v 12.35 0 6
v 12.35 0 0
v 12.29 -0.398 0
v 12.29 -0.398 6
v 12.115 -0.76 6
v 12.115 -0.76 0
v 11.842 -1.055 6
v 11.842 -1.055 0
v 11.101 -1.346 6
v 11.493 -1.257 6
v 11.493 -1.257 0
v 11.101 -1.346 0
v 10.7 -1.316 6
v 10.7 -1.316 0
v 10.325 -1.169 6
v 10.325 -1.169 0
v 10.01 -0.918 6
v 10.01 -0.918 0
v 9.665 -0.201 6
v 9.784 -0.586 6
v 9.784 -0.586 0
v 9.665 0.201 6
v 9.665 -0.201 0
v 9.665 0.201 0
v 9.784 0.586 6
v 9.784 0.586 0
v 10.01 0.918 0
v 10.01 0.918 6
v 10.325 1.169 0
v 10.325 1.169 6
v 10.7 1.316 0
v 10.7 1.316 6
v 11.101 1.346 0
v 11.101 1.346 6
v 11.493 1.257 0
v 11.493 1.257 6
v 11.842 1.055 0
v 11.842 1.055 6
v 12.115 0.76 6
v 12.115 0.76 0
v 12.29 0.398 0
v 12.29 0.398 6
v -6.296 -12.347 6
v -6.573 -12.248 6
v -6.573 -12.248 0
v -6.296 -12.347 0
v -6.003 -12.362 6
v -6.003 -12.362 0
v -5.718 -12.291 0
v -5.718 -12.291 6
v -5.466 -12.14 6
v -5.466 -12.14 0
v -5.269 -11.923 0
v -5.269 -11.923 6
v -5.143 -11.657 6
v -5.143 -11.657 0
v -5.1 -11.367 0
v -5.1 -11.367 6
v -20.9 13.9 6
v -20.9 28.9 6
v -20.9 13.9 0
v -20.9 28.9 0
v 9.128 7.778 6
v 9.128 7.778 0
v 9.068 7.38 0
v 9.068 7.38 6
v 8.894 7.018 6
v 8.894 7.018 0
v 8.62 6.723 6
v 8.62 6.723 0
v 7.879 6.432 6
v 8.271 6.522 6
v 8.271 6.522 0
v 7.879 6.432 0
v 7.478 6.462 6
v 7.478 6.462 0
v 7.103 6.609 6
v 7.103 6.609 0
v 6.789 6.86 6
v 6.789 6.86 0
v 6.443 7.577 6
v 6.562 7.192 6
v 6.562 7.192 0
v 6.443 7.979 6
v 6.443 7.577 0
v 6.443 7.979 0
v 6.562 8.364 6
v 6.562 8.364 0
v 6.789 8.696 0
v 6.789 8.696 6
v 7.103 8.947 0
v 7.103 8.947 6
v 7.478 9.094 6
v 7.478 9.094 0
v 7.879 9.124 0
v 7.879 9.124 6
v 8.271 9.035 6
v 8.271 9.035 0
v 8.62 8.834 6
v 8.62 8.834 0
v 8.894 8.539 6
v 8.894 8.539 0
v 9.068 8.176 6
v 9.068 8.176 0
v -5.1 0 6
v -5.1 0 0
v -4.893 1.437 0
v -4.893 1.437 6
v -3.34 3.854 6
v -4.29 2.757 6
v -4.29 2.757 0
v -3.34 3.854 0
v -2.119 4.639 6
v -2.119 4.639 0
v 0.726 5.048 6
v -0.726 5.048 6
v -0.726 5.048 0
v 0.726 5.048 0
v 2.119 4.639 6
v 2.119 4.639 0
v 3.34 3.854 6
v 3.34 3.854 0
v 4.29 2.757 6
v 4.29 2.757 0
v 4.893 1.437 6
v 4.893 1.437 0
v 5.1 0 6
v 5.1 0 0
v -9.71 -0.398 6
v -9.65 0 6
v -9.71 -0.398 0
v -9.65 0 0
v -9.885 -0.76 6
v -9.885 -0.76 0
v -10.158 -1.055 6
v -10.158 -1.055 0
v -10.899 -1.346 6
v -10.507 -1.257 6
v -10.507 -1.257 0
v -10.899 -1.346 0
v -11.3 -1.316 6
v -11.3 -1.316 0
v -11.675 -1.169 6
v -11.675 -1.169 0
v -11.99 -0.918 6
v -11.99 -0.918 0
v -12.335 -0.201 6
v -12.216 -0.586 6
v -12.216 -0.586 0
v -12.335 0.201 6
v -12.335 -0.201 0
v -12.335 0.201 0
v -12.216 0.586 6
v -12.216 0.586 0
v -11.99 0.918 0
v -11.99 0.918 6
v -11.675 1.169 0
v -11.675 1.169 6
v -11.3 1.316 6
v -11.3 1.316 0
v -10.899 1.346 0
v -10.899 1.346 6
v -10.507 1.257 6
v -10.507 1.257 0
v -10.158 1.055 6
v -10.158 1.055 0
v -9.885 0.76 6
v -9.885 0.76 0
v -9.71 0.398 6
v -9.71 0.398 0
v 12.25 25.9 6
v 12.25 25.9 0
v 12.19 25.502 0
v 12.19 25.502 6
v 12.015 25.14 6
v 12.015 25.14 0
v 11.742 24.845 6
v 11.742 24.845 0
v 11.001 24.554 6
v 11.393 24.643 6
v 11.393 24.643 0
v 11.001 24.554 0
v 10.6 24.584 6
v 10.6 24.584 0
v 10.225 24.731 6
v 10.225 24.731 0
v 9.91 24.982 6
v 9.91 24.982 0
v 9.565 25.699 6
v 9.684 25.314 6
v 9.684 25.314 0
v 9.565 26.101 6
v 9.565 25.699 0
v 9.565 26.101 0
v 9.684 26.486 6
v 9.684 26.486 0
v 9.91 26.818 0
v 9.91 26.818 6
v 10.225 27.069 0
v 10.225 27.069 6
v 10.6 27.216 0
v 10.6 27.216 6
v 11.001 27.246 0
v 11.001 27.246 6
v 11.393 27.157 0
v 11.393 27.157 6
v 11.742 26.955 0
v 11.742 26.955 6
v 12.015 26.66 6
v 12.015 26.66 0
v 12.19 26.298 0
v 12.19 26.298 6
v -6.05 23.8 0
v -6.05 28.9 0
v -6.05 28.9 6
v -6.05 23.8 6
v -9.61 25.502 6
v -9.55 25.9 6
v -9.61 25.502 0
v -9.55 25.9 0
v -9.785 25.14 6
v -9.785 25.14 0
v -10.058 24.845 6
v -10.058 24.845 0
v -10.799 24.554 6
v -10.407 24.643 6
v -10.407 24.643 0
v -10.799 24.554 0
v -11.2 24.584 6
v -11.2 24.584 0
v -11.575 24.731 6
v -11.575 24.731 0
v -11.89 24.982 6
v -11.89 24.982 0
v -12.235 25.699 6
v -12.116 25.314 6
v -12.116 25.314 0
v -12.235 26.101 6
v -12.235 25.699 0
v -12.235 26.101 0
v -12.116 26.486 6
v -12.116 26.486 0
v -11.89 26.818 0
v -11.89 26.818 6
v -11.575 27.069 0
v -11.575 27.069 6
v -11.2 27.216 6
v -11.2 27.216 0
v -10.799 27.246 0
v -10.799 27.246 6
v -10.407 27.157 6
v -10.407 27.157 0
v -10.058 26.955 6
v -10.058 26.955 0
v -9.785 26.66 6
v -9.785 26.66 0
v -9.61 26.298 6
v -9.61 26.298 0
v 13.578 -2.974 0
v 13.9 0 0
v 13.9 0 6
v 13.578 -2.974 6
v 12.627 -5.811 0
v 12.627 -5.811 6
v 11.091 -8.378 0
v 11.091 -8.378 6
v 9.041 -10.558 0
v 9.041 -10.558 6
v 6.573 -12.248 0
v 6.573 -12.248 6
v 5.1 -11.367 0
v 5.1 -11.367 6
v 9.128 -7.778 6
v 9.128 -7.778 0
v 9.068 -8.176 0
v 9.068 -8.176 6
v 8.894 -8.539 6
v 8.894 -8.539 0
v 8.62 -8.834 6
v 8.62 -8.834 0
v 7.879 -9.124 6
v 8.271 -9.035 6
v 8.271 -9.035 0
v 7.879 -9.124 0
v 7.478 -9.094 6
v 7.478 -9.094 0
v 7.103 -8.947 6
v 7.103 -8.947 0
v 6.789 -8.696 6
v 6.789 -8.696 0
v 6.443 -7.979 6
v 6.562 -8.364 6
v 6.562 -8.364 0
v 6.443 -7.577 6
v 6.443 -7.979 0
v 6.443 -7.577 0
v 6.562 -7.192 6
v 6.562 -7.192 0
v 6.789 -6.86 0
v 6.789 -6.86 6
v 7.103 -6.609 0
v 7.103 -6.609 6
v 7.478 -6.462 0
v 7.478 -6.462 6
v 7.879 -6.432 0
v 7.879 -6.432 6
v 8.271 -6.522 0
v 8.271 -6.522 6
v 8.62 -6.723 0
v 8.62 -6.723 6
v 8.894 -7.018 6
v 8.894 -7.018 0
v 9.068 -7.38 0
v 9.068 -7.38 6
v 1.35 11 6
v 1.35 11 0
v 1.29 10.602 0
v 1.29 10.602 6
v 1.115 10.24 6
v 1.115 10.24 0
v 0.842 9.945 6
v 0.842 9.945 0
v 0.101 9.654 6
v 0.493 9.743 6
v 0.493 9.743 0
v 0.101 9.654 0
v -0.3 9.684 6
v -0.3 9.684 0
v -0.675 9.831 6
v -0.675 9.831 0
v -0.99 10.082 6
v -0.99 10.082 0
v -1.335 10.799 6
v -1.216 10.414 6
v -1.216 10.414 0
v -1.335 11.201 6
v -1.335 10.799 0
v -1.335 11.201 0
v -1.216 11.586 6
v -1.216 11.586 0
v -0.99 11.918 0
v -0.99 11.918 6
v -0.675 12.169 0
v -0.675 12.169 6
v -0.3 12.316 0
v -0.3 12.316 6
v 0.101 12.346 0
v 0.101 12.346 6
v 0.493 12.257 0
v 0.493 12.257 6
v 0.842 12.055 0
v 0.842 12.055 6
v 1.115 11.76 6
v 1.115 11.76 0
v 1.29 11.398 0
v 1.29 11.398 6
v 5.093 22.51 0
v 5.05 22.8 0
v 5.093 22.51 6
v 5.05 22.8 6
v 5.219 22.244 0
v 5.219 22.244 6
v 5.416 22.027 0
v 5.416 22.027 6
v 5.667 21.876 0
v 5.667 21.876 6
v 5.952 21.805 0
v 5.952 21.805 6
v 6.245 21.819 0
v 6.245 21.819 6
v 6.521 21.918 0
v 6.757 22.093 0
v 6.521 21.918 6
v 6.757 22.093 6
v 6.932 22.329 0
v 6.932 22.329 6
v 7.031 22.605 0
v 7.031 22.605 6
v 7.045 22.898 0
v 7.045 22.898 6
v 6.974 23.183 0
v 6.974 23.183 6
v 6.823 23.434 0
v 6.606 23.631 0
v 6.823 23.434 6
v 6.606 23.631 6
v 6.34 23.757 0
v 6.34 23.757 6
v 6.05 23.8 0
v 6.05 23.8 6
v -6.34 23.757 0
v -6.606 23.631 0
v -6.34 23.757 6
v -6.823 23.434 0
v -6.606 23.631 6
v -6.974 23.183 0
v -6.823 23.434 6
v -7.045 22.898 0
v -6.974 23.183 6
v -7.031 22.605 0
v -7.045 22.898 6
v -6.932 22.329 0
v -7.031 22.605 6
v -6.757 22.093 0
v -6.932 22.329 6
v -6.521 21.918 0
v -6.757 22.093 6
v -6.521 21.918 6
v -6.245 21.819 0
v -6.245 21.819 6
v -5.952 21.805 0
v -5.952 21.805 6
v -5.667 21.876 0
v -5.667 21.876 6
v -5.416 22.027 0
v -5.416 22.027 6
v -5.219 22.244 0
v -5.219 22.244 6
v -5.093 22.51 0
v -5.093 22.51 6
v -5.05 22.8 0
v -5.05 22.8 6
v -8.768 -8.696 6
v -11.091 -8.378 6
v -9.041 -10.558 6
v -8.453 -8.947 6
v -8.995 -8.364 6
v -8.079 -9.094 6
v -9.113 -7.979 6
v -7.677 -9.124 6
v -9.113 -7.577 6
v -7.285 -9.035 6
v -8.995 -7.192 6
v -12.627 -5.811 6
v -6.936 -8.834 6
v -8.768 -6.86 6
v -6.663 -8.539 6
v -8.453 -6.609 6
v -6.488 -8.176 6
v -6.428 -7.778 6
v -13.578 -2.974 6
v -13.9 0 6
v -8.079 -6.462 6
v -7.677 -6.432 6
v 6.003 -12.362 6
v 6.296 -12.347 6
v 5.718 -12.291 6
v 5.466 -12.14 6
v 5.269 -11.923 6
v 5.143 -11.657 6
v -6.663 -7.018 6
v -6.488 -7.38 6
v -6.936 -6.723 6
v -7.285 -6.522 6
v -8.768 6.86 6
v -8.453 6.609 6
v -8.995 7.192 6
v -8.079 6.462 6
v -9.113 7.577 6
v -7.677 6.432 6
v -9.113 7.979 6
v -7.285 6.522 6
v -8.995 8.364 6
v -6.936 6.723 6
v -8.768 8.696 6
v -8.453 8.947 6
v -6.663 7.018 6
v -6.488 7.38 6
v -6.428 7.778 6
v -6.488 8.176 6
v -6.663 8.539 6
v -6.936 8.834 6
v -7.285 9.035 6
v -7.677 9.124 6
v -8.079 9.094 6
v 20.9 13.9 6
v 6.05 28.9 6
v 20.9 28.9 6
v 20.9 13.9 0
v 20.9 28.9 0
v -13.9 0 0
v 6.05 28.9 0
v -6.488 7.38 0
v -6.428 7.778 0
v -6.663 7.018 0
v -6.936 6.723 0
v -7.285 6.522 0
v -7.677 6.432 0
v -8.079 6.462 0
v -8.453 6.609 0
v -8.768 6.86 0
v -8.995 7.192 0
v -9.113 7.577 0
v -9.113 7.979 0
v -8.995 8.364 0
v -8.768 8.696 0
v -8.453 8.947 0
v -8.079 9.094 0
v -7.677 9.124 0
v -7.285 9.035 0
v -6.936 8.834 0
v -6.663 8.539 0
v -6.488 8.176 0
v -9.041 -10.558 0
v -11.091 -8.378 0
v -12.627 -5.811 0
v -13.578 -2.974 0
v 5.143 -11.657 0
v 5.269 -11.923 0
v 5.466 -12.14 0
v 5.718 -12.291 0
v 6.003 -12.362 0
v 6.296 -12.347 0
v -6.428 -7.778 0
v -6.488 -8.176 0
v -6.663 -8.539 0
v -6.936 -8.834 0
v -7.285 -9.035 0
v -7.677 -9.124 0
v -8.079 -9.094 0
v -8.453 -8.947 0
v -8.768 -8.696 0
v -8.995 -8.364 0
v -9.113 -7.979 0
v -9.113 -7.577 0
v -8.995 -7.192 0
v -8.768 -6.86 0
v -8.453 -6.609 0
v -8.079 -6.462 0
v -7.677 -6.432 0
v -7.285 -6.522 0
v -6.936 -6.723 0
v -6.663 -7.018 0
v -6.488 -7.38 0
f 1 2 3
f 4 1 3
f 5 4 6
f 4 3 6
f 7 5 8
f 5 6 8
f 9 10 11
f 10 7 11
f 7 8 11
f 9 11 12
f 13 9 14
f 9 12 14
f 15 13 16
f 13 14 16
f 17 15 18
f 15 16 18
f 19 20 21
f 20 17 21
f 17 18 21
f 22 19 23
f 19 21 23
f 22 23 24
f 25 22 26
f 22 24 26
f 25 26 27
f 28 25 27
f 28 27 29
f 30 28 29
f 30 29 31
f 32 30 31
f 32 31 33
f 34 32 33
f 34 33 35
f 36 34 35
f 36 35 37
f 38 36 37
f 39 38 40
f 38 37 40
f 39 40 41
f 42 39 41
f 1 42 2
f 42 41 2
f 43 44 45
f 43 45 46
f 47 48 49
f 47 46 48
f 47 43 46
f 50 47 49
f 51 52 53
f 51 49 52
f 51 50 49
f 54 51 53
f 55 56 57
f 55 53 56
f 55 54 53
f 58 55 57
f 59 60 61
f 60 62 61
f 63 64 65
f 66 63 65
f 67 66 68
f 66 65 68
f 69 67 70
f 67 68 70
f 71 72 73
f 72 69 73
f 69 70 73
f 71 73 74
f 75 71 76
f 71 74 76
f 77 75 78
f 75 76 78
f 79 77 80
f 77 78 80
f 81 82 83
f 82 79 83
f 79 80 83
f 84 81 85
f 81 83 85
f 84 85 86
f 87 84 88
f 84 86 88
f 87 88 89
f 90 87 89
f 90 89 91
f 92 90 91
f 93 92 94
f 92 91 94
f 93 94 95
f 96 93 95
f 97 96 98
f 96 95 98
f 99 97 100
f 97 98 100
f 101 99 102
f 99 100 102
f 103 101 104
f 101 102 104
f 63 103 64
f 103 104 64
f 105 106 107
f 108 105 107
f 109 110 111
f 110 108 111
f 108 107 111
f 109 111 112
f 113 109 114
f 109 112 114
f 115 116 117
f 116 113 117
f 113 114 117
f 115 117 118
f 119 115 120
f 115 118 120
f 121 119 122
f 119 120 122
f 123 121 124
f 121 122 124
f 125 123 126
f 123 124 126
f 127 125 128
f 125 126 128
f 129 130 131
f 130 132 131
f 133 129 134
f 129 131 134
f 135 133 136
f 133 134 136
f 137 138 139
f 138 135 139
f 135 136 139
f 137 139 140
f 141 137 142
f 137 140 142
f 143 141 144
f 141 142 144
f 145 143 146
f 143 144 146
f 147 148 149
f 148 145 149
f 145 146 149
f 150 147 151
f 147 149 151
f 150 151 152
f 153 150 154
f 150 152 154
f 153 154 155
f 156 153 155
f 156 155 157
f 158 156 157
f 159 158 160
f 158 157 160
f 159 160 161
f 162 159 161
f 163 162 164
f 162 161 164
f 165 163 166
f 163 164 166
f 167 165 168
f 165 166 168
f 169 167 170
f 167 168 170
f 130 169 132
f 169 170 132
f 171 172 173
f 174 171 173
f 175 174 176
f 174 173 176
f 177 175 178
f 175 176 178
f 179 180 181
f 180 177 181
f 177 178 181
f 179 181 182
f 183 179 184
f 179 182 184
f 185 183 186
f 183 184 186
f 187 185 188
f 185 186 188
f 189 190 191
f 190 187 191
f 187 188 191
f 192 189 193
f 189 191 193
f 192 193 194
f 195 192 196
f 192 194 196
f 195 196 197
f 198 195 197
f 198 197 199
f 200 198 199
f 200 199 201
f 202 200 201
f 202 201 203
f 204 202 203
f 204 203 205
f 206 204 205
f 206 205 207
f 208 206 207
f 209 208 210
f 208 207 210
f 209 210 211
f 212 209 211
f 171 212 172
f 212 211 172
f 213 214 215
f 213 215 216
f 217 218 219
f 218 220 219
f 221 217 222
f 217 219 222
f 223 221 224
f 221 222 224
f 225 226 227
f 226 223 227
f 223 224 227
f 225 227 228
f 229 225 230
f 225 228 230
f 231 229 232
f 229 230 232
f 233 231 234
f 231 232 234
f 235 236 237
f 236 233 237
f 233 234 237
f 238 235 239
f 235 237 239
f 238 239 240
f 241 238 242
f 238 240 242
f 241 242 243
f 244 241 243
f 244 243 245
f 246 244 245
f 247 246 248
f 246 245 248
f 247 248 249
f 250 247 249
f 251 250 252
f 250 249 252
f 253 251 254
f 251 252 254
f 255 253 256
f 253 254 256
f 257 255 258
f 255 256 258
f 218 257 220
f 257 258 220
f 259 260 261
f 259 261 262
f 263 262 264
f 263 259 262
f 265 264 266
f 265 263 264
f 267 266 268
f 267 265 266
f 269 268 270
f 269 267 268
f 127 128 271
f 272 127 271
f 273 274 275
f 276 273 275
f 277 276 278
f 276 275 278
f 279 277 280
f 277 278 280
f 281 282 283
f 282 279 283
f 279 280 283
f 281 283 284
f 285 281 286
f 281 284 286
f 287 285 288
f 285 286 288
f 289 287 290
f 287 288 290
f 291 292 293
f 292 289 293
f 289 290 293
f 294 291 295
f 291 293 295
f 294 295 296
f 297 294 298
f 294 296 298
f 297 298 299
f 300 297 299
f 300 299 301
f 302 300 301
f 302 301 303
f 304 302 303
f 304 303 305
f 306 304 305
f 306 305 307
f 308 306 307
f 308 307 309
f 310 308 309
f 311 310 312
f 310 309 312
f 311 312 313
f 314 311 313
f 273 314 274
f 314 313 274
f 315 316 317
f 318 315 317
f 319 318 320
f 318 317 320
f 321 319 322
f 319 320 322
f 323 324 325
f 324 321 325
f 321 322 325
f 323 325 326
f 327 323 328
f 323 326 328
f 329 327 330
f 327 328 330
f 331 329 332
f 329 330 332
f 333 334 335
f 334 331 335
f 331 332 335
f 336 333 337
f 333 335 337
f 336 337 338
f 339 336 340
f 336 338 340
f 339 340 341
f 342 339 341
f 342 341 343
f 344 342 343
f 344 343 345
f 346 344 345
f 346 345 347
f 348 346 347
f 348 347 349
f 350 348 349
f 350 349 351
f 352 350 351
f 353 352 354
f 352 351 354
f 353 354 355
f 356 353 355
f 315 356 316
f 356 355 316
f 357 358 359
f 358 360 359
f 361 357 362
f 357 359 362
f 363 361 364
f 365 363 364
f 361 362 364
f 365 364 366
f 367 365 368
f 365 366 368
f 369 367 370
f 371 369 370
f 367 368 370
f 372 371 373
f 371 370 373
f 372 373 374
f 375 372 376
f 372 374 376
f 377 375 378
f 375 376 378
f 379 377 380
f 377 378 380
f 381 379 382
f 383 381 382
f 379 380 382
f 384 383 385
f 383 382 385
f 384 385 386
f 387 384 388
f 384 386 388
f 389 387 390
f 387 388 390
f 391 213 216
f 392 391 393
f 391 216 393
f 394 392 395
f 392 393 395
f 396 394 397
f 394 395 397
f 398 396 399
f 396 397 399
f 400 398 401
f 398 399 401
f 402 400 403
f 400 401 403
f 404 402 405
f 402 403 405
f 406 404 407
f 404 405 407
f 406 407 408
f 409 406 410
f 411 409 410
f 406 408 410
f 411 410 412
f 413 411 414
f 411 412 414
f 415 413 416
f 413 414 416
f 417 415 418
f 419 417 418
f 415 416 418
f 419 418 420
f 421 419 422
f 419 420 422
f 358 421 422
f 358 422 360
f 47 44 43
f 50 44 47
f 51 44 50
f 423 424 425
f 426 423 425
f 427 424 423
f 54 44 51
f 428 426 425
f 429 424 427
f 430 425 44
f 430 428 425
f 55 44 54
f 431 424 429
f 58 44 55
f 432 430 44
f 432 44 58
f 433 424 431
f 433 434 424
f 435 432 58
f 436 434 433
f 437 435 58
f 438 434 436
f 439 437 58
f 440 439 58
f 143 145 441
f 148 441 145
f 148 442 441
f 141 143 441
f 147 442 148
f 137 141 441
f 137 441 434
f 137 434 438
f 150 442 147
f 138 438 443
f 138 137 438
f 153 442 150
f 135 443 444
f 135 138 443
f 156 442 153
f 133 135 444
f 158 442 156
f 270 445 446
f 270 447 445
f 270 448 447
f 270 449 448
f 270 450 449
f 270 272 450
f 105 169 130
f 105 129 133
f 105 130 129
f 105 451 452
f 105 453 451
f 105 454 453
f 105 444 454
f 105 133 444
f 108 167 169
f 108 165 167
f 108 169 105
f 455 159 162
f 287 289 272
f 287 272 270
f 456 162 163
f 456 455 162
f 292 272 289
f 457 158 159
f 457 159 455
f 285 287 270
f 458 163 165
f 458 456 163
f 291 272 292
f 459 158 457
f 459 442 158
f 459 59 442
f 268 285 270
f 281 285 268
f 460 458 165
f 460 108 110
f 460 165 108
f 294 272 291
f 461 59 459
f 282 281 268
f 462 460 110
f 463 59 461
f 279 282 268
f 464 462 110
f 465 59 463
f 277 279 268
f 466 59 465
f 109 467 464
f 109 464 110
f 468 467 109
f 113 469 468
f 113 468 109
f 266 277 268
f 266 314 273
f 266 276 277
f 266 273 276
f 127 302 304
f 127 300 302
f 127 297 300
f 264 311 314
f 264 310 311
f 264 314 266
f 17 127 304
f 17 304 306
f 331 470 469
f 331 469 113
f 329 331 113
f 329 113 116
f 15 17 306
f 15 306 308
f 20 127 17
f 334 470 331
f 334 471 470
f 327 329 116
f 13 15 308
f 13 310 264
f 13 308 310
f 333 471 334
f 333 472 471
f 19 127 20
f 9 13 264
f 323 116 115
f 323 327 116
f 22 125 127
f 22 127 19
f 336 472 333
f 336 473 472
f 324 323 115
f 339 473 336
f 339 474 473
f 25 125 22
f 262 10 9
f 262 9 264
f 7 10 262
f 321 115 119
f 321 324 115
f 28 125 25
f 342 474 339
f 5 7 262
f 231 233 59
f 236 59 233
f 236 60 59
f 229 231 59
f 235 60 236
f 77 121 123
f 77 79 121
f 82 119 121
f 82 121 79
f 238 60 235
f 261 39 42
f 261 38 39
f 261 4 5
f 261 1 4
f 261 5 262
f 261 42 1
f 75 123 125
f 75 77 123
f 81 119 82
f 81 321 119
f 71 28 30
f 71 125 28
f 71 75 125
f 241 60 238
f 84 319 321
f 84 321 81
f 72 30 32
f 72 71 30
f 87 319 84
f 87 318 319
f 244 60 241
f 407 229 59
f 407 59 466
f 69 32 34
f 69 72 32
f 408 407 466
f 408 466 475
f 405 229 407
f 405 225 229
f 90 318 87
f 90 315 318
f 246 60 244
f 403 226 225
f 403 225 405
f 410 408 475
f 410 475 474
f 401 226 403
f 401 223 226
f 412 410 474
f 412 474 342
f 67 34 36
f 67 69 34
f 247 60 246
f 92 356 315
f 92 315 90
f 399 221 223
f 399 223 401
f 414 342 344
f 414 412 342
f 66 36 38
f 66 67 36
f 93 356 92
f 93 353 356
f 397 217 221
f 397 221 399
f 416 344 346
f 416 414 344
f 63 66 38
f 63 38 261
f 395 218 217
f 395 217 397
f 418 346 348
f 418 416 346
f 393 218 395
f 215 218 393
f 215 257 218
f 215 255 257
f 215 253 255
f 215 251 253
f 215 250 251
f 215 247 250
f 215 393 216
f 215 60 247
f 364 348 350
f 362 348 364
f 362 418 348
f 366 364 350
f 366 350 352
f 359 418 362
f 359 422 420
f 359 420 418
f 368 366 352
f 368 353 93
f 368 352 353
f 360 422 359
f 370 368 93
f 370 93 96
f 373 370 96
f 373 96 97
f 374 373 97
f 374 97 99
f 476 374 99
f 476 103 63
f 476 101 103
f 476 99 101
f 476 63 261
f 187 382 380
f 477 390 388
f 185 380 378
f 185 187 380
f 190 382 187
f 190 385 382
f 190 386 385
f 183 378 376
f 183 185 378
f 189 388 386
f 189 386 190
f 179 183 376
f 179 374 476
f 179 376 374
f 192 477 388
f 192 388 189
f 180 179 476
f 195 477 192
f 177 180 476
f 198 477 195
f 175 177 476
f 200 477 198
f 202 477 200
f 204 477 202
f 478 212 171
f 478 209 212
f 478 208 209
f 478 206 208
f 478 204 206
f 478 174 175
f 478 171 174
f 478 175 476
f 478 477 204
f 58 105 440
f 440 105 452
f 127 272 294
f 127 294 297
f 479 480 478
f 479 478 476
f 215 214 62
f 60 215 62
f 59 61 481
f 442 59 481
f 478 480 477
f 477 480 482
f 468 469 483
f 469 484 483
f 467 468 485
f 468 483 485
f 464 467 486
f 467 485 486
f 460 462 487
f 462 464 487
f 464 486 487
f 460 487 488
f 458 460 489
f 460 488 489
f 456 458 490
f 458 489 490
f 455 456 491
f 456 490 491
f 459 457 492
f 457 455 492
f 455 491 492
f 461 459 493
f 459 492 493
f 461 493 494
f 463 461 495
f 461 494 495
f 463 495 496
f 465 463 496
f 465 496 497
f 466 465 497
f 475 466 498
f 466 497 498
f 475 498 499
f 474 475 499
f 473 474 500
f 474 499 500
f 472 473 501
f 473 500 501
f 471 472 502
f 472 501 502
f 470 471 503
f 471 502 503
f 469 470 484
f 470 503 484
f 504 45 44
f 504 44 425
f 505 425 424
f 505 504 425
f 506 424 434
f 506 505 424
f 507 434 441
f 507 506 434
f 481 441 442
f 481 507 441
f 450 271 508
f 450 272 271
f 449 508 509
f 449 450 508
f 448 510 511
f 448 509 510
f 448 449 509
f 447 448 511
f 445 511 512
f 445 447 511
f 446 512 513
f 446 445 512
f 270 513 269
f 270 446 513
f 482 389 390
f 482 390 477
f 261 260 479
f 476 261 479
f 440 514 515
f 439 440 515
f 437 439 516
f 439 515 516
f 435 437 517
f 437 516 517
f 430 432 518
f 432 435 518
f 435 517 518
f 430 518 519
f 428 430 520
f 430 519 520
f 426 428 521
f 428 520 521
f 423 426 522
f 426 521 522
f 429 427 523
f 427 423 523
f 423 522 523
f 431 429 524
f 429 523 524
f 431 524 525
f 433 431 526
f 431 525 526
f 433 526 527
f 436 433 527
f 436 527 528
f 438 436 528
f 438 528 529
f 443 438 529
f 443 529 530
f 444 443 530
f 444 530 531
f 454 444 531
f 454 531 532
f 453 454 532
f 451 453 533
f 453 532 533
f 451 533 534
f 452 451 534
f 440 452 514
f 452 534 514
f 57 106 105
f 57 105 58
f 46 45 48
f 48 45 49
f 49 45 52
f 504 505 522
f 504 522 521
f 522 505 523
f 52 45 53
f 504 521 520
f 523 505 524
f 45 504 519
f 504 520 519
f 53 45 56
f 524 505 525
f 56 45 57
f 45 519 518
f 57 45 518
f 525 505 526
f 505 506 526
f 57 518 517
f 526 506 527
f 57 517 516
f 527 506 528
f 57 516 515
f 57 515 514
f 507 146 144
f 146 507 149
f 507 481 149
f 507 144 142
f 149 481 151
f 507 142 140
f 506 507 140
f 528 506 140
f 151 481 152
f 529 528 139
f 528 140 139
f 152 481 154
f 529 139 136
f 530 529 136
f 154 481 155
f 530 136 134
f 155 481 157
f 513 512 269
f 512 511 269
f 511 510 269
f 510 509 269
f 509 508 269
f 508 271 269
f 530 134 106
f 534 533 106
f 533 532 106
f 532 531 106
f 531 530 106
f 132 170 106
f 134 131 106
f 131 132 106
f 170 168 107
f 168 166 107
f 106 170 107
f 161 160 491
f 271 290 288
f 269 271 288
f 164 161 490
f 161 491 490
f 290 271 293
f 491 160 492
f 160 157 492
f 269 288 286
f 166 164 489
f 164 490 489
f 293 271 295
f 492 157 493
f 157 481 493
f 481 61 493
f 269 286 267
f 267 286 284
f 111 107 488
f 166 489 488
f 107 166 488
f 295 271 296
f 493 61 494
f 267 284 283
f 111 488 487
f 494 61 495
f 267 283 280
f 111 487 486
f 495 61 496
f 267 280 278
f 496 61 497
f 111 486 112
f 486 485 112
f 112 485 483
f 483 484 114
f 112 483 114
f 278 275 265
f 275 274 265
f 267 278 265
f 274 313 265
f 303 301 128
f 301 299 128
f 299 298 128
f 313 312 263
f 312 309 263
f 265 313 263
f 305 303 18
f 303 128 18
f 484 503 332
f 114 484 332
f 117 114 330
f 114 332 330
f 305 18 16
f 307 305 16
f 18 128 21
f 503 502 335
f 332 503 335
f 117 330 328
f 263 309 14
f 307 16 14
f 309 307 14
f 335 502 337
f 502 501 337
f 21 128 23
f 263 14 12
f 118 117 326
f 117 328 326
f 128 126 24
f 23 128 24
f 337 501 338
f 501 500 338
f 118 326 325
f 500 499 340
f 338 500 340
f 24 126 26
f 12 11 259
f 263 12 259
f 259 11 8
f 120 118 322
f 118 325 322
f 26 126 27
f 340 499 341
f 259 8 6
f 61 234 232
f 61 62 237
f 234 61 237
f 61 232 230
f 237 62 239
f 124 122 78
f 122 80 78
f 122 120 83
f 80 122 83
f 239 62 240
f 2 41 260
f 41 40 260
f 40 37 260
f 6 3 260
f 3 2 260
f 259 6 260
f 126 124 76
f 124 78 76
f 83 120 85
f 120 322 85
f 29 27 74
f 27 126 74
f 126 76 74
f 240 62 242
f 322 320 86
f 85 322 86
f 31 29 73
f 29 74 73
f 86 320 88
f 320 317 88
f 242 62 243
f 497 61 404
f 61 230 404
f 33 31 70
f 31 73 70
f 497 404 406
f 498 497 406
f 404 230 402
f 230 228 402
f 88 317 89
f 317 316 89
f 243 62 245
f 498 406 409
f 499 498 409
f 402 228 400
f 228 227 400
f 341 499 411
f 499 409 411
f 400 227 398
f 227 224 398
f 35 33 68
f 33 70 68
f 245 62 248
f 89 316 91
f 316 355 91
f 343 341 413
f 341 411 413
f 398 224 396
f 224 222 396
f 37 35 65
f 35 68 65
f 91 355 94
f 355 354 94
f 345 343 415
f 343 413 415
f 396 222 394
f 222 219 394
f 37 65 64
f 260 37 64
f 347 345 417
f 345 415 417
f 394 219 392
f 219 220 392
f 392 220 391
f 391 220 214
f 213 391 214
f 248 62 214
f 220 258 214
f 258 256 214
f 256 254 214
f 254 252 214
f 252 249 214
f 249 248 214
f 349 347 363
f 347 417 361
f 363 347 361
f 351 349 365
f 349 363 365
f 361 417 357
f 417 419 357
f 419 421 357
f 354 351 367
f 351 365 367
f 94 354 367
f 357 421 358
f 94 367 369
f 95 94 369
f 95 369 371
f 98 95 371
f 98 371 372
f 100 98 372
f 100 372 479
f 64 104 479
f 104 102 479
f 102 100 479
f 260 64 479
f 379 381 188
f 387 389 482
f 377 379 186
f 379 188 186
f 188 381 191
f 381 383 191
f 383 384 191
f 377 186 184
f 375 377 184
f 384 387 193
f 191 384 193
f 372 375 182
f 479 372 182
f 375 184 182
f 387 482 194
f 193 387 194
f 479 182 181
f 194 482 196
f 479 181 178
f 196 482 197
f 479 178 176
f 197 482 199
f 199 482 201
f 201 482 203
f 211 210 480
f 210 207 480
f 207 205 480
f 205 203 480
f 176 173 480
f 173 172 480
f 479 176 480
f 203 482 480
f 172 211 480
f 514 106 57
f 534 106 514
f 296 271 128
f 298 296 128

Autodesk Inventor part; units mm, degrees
ref_plane "YZ Plane" through (0, 0, 0) normal (1, 0, 0) x (0, 1, 0)
ref_plane "XZ Plane" through (0, 0, 0) normal (0, 1, 0) x (-1, 0, 0)
ref_plane "XY Plane" through (0, 0, 0) normal (0, 0, 1) x (1, 0, 0)
ref_plane "작업 평면1" through (0, 0, 0) normal (0, 0, 1) x (1, 0, 0)
sketch "스케치1" plane through (0, 0, 0) normal (0, 0, 1) x (1, 0, 0)
  circle A0 centre (-7.7782, -7.7782) radius 1.55 projected
  circle A1 centre (7.7782, -7.7782) radius 1.55 projected
  circle A2 centre (7.7782, 7.7782) radius 1.55 projected
  circle A3 centre (-7.7782, 7.7782) radius 1.55 projected
  circle A4 centre (0, 0) radius 5 projected
  circle A5 centre (0, 0) radius 13.9 projected
  circle A6 centre (0, 11) radius 1.55 projected
  circle A7 centre (11, 0) radius 1.55 projected
  circle A8 centre (0, -11) radius 1.55 projected
  circle A9 centre (-11, 0) radius 1.55 projected
  line L0 (13.9, 0) -> (13.9, 13.9)
  line L1 (13.9, 13.9) -> (-13.9, 13.9)
  line L2 (-13.9, 13.9) -> (13.9, 13.9)
  line L3 (13.9, 28.9) -> (-13.9, 28.9)
  line L4 (3.1, 28.9) -> (-3.1, 28.9)
  circle A10 centre (0, 0) radius 5.1
  circle A11 centre (-7.7782, 7.7782) radius 1.35
  circle A12 centre (-11, 0) radius 1.35
  circle A13 centre (-7.7782, -7.7782) radius 1.35
  circle A14 centre (0, -11) radius 1.35
  circle A15 centre (7.7782, -7.7782) radius 1.35
  circle A16 centre (11, 0) radius 1.35
  circle A17 centre (7.7782, 7.7782) radius 1.35
  circle A18 centre (0, 11) radius 1.35
  circle A19 centre (0, 0) radius 13.9
  line L5 (-5.1, 0) -> (-5.1, -12.9306)
  line L6 (5.1, 0) -> (5.1, -12.9306)
  line L7 (6.05, 28.9) -> (-6.05, 28.9)
  line L8 (-6.05, 28.9) -> (-6.05, 22.8)
  line L9 (-6.05, 22.8) -> (6.05, 22.8)
  line L10 (6.05, 22.8) -> (6.05, 28.9)
  line L11 (13.9, 28.9) -> (20.9, 28.9)
  line L12 (20.9, 28.9) -> (20.9, 13.9)
  line L13 (20.9, 13.9) -> (13.9, 13.9)
  line L14 (-13.9, 28.9) -> (-20.9, 28.9)
  line L15 (-20.9, 28.9) -> (-20.9, 13.9)
  line L16 (-20.9, 13.9) -> (-13.9, 13.9)
  line L17 (-20.9, 13.9) -> (-13.9, 0)
  line L18 (13.9, 0) -> (20.9, 13.9)
  circle A20 centre (-10.9, 25.9) radius 1.35
  circle A21 centre (10.9, 25.9) radius 1.35
  point P0 (0, 0)
  point P1 (0, 13.9)
  dimension "d24" = 0.1
  dimension "d25" = 2.7
  dimension "d28" = 360
  dimension "d30" = 12.1
  dimension "d31" = 6.1
  dimension "d39" = 2.7
  dimension "d40" = 2.7
extrude "돌출7" add sketch "스케치1" along normal blind 6 contours A0 | A1 | A2 | A3 | A5 L6 A10 L5 | L17 L16 L1 A5 | L1 L0 A5 | L1 L16 L15 L14 L3 L8 L9 L10 L11 L12 L13 | L0 L13 L18 | A6 | A7 | A9 picked at (-7.5104, -2.4224)
fillet "모깎기3" radius 1 2 edges at (-5.1, -12.9306, 3) (5.1, -12.9306, 3)
sketch "스케치2" plane through (0, 0, 6) normal (0, 0, 1) x (1, 0, 0)
  line L0 (-6.05, 22.8) -> (-6.05, 28.9) projected
  line L1 (6.05, 22.8) -> (-6.05, 22.8) projected
  line L2 (6.05, 28.9) -> (6.05, 22.8) projected
  circle A0 centre (-6.05, 22.8) radius 1
  circle A1 centre (6.05, 22.8) radius 1
  point P0 (0, 0)
  dimension "d47" = 2
  dimension "d48" = 2
extrude "돌출8" cut sketch "스케치2" against normal blind 10
properties part number "leg_between_64" material "PMMA 플라스틱"
